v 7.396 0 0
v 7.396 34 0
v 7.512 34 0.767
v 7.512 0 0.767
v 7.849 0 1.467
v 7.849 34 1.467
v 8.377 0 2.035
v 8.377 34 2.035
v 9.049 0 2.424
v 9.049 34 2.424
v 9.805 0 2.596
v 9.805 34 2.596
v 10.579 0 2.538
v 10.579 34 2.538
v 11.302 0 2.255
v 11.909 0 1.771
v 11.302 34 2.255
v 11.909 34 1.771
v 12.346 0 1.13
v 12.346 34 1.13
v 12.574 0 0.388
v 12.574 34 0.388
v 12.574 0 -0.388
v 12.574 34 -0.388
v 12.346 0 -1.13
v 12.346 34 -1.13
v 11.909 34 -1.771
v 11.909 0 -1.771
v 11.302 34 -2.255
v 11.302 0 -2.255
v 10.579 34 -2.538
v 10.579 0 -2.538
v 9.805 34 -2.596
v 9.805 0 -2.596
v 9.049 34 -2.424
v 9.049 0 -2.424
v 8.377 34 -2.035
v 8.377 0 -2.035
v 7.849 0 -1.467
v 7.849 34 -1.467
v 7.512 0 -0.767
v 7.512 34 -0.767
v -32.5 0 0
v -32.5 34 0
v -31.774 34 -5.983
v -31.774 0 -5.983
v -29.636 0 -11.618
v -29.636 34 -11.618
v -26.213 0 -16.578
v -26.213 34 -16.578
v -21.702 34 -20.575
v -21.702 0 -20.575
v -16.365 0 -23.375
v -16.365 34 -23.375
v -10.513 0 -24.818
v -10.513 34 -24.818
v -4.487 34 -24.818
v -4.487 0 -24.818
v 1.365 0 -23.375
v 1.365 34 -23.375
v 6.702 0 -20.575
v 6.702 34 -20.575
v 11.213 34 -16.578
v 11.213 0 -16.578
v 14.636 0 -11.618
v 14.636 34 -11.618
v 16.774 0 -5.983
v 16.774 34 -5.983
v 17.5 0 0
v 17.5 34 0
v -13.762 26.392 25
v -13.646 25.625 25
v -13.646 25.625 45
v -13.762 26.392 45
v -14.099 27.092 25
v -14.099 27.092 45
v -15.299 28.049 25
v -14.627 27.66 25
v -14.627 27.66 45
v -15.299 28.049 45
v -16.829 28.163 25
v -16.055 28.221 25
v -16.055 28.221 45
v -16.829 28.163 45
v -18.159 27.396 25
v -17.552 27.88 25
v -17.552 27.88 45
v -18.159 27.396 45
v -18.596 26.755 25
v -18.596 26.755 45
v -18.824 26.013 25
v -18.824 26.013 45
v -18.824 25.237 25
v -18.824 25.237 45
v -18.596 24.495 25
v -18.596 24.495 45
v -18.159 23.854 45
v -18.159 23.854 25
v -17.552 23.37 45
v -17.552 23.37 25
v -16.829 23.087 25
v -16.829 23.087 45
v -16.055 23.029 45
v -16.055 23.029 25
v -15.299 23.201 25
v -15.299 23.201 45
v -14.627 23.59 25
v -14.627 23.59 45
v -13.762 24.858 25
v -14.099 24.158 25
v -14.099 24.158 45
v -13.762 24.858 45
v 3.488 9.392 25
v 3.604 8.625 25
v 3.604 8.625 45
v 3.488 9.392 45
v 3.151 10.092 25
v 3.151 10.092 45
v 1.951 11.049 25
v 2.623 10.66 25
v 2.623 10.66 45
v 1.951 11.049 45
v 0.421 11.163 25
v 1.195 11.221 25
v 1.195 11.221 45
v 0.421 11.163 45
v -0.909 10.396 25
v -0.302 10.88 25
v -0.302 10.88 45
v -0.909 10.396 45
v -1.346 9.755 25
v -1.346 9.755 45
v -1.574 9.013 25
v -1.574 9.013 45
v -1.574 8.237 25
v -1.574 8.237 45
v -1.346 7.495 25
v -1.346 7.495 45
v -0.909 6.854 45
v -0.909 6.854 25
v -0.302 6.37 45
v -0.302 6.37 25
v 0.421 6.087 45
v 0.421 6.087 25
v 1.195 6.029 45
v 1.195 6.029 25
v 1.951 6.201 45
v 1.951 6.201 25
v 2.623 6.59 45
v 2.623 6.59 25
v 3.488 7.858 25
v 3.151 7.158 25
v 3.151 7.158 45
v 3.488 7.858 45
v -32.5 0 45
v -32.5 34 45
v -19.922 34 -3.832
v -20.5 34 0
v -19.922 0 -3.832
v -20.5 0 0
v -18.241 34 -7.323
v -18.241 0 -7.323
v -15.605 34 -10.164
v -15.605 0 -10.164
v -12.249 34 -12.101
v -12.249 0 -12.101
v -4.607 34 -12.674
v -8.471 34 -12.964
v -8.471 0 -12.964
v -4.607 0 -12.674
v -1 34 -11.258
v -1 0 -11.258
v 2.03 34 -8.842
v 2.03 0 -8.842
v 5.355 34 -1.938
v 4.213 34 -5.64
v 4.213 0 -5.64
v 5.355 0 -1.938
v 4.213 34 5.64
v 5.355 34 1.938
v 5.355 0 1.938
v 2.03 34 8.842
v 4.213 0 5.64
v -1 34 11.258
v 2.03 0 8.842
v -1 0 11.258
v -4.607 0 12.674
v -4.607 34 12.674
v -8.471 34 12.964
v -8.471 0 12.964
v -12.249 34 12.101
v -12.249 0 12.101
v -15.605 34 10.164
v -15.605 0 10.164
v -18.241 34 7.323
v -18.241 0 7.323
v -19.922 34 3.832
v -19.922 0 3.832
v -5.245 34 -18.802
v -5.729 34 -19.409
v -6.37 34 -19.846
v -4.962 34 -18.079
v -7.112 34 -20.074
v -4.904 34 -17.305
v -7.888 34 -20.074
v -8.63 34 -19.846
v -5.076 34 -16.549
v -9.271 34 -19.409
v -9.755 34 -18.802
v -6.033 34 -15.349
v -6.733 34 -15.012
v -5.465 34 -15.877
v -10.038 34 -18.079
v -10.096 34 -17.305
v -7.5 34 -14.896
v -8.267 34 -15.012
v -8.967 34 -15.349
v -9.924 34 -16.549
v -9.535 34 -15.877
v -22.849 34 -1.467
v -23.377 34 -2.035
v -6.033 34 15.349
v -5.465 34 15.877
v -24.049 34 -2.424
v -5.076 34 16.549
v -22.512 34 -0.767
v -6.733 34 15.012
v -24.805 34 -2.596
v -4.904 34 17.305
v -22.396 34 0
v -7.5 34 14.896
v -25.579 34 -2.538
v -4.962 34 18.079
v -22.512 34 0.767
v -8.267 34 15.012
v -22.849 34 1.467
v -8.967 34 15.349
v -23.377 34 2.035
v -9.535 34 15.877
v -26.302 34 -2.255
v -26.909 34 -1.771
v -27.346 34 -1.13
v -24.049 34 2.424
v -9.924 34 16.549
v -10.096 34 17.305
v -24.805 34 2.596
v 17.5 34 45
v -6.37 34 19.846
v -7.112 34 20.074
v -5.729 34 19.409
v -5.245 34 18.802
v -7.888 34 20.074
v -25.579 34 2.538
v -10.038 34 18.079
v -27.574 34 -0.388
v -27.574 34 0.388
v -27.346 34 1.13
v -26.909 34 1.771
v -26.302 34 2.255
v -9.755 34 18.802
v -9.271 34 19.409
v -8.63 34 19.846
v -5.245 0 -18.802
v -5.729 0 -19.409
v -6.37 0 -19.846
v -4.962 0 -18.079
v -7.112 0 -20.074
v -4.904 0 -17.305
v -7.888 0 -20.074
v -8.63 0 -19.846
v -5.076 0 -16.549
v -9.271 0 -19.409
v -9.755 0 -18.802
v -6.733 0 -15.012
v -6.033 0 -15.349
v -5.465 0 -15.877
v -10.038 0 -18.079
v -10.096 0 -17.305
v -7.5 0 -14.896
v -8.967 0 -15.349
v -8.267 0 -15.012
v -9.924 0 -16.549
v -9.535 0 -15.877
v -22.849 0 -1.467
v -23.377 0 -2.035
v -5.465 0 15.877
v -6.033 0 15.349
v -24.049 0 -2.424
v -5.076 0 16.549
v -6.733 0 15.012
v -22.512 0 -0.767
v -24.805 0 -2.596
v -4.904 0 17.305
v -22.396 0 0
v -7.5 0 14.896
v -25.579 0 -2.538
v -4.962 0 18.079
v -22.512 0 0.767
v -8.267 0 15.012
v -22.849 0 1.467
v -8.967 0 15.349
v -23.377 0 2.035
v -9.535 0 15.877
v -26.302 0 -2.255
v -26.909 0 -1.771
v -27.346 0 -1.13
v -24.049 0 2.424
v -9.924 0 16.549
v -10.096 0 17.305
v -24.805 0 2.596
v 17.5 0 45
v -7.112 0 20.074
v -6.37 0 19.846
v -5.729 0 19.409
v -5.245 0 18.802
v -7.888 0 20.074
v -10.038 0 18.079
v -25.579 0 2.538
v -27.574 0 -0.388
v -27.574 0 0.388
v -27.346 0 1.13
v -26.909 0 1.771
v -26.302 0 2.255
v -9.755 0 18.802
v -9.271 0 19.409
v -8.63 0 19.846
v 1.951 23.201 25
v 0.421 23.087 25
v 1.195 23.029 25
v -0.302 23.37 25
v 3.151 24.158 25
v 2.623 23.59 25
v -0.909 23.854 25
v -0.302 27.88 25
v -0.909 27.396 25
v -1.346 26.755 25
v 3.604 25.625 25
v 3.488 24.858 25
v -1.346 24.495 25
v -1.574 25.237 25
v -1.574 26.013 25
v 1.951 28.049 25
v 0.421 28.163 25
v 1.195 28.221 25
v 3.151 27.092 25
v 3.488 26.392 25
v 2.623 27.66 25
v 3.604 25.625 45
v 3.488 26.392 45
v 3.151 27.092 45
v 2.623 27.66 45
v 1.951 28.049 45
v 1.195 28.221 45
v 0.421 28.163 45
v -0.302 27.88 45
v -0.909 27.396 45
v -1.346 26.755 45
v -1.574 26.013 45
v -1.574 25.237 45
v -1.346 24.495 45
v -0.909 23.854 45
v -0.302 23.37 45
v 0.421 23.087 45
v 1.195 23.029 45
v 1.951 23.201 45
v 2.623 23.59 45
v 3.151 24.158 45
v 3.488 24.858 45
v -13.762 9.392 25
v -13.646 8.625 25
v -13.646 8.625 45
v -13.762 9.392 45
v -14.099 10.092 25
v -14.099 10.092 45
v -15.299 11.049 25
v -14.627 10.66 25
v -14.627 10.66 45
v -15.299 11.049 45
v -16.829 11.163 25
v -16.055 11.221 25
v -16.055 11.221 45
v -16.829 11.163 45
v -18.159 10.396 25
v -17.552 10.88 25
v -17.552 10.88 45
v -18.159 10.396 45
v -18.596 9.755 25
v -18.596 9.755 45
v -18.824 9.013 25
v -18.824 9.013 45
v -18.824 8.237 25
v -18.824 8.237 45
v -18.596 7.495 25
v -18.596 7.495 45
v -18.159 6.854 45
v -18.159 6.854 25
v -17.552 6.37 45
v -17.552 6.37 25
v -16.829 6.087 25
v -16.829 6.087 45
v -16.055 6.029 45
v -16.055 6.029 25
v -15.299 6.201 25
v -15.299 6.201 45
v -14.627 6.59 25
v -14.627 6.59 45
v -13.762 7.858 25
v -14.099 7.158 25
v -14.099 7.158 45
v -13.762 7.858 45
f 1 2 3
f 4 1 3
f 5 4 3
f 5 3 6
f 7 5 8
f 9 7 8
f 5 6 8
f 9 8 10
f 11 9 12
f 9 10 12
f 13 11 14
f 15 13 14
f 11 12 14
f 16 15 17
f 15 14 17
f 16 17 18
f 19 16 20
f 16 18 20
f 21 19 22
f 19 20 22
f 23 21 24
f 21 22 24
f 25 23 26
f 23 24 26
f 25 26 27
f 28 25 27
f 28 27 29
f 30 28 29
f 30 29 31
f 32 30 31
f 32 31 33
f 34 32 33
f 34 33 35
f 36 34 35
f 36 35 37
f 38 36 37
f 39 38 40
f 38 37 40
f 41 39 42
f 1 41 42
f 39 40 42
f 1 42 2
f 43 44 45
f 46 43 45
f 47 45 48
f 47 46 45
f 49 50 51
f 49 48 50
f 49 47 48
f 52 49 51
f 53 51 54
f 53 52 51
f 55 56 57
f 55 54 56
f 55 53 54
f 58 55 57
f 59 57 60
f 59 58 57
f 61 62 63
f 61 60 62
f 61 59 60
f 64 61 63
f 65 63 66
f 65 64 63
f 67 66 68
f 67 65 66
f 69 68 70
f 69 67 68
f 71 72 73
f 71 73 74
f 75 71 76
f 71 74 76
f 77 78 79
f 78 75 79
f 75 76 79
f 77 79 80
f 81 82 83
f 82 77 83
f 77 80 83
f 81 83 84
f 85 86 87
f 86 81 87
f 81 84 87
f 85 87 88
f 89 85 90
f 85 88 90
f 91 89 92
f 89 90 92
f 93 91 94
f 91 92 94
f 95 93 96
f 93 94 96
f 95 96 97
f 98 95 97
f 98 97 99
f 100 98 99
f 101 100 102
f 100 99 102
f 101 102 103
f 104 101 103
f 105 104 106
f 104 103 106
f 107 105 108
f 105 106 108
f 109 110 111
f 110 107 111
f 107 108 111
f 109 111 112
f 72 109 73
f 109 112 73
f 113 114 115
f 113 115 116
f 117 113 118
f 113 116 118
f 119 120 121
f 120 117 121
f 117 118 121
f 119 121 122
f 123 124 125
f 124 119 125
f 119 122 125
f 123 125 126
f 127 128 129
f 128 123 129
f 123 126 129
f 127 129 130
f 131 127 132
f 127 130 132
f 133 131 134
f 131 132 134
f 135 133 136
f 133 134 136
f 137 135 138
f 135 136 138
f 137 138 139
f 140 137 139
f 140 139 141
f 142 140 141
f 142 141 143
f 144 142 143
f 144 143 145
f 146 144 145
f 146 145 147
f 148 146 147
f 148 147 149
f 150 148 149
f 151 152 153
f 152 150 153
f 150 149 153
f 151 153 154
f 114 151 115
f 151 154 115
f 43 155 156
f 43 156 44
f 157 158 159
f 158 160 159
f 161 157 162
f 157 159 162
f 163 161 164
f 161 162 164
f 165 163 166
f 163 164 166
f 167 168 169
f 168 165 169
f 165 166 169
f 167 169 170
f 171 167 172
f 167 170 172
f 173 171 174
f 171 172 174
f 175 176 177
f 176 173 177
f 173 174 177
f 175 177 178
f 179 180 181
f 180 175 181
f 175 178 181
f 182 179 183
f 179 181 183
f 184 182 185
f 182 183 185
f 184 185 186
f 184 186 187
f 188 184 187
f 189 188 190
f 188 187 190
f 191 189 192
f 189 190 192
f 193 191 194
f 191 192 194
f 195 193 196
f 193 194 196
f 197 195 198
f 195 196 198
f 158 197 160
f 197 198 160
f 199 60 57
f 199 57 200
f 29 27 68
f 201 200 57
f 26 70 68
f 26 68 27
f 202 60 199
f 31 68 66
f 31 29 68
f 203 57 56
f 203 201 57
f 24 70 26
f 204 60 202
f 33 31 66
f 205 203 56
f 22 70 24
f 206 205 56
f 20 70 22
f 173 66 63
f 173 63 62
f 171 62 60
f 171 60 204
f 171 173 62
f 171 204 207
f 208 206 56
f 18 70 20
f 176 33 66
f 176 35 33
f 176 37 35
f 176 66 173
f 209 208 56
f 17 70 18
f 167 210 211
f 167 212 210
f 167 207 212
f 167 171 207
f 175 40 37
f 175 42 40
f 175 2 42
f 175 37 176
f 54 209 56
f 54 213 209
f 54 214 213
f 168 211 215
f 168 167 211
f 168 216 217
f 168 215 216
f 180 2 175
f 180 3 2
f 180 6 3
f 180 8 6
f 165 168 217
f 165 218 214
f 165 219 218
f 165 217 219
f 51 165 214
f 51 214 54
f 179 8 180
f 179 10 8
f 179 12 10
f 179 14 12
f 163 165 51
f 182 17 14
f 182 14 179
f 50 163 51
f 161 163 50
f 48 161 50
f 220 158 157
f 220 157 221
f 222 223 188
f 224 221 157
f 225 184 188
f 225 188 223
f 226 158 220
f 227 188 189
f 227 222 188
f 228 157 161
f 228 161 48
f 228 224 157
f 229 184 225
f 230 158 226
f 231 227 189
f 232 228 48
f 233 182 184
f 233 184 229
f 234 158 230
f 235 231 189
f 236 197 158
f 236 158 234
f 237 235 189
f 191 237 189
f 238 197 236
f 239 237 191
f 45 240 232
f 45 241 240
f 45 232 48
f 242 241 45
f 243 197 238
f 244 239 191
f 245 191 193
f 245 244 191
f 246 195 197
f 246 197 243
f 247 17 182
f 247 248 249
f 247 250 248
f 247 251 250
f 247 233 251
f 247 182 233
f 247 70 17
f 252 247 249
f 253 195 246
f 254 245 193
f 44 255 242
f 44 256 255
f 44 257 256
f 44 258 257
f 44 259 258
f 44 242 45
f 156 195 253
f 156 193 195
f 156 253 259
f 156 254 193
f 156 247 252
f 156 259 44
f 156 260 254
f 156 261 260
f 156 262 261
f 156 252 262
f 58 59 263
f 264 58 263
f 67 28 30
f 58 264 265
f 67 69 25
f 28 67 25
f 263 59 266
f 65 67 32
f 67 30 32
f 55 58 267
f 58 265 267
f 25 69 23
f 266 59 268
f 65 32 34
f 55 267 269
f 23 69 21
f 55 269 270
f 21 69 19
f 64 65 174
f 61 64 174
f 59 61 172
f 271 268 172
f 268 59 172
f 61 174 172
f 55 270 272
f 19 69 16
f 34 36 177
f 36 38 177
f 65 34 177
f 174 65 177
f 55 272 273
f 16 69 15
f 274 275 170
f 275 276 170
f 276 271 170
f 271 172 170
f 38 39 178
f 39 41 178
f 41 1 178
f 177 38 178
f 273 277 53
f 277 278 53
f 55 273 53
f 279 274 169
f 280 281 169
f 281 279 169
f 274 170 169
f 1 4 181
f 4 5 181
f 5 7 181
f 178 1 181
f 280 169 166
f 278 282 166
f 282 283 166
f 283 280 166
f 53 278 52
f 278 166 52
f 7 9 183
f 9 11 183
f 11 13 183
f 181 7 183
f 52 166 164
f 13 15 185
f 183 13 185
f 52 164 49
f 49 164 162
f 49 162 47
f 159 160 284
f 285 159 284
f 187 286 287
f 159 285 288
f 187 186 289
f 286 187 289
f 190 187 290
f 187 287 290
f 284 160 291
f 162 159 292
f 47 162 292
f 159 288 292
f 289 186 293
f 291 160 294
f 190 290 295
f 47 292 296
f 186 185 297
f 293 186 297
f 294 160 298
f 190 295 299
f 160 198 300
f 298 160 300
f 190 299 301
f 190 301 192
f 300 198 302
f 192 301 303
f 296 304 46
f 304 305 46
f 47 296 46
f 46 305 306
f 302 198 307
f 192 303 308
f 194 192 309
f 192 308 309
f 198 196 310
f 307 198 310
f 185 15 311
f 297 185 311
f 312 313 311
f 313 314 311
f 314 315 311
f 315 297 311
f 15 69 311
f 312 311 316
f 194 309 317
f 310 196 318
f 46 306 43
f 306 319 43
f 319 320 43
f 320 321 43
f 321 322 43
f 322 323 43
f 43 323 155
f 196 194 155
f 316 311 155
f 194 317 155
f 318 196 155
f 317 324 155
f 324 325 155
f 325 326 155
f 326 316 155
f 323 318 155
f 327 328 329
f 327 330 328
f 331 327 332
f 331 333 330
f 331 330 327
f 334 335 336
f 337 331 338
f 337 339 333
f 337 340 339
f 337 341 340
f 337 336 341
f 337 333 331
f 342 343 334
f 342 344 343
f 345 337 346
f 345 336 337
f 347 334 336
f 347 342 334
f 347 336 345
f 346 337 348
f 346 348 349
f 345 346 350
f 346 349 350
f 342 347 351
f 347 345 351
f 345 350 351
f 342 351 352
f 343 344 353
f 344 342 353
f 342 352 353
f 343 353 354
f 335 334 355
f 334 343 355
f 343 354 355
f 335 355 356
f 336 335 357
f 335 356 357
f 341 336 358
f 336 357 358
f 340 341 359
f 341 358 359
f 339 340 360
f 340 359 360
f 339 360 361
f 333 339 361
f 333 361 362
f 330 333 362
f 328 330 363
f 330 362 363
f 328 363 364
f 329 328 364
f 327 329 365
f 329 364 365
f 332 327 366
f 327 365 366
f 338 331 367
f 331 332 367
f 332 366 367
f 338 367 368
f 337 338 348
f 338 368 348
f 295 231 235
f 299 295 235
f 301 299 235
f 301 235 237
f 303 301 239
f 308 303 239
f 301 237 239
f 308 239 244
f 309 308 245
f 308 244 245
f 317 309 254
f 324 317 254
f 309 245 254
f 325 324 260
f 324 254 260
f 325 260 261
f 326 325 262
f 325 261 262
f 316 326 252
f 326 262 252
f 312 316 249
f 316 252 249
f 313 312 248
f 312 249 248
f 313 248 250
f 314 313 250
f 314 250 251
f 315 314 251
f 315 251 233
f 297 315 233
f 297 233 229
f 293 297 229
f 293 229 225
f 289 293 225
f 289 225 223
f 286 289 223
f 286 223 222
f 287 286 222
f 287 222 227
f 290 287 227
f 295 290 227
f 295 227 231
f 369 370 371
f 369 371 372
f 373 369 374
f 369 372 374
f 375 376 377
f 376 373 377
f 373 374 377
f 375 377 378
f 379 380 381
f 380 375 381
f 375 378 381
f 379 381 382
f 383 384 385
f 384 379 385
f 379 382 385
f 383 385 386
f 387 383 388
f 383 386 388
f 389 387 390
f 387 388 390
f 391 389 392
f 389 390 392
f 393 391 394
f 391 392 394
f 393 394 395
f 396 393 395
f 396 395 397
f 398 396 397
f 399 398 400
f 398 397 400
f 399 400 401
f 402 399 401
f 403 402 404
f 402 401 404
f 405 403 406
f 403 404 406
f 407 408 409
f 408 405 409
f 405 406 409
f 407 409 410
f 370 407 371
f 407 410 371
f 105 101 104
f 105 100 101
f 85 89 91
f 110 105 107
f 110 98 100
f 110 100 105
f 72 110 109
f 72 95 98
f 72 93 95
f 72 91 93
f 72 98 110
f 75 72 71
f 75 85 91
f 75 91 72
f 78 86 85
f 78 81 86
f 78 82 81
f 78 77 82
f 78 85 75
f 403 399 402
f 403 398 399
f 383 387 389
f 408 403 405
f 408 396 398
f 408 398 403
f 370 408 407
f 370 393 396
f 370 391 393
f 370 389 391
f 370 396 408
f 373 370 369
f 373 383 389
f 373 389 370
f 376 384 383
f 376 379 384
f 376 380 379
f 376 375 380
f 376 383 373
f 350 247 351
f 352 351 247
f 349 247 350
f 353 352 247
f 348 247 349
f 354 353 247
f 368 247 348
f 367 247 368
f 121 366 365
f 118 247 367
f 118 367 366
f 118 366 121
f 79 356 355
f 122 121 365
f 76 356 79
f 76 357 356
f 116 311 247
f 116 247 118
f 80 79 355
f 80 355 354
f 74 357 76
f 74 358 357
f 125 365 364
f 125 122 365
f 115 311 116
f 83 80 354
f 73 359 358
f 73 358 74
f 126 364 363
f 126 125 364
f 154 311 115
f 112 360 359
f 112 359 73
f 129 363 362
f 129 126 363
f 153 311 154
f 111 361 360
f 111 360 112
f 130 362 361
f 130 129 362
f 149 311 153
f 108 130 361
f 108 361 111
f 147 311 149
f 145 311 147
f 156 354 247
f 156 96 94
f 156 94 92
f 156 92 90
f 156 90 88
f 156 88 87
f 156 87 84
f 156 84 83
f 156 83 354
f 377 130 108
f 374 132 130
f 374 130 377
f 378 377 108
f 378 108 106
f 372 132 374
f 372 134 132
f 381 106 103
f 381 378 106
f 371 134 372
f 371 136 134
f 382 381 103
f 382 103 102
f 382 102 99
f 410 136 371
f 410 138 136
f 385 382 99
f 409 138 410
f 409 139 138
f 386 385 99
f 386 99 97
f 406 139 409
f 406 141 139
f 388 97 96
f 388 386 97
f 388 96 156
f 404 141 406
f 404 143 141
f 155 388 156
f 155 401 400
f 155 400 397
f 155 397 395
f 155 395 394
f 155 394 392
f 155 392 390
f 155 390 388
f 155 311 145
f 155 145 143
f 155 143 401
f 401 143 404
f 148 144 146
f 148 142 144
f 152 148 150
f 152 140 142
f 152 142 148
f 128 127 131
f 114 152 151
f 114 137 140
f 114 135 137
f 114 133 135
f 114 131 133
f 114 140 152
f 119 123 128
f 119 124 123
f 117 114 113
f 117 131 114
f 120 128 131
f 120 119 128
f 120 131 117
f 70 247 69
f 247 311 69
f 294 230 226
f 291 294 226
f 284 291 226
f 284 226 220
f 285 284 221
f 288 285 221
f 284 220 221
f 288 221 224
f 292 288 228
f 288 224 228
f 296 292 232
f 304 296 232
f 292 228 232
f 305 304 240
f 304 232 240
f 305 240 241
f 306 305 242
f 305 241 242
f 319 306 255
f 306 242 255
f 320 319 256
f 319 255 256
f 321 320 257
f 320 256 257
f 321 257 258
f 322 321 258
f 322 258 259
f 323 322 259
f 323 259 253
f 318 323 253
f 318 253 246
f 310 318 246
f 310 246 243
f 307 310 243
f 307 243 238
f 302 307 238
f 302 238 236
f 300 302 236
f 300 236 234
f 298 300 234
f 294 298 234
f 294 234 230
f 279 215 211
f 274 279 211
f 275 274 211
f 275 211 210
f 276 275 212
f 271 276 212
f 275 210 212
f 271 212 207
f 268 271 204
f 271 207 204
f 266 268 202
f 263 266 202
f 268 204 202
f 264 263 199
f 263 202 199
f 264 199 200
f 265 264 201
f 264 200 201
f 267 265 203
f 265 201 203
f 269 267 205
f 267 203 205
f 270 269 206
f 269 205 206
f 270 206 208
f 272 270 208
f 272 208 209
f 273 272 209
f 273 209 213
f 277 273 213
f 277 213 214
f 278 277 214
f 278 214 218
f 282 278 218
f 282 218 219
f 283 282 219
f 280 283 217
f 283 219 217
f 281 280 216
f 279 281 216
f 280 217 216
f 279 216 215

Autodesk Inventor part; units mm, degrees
ref_plane "YZ Plane" through (0, 0, 0) normal (1, 0, 0) x (0, 1, 0)
ref_plane "XZ Plane" through (0, 0, 0) normal (0, 1, 0) x (-1, 0, 0)
ref_plane "XY Plane" through (0, 0, 0) normal (0, 0, 1) x (1, 0, 0)
sketch "Sketch1" plane through (0, 0, 0) normal (0, 1, 0) x (-1, 0, 0)
  circle A0 centre (7.5, 0) radius 13
  line L0 (-17.5, 45) -> (32.5, 45)
  line L1 (32.5, 45) -> (32.5, 0)
  line L2 (-17.5, 45) -> (-17.5, 0)
  arc A1 (-17.5, 0) -> (32.5, 0) centre (7.5, 0) ccw
  point P0 (0, 0)
  dimension "d1" = 26
  dimension "d6" = 50
  dimension "d29" = 45
extrude "Base" add sketch "Sketch1" along normal blind 34
sketch "Sketch3" plane through (0, 34, 0) normal (0, 1, 0) x (1, 0, 0)
  circle A0 centre (-7.5, 0) radius 13 projected
  line L0 (-7.5, 0) -> (-25, 0)
  line L1 (-25, 0) -> (10, 0)
  circle A1 centre (-25, 0) radius 2.6035
  point P0 (0, 0)
  dimension "d10" = 35
  dimension "d11" = 5.207
extrude "Screw Hole" cut sketch "Sketch3" against normal through all contours A1
pattern_circular "Circular Pattern1" count 4 over 360 about axis through (-7.5, 0, 0) along (0, 1, 0) of "Screw Hole"
sketch "Sketch4" plane through (-32.5, 0, 45) normal (0, 0, 1) x (1, 0, 0)
  line L0 (0, 0) -> (0, 34) projected
  line L1 (0, 17) -> (50, 17)
  line L2 (50, 0) -> (50, 34) projected
  line L3 (25, 17) -> (25, 25.625)
  line L4 (25, 25.625) -> (33.5, 25.625)
  circle A0 centre (33.5, 25.625) radius 2.6035
  point P0 (32.5, 0)
  dimension "d17" = 8.625
  dimension "d18" = 8.5
  dimension "d19" = 5.207
extrude "Mount Holes" cut sketch "Sketch4" against normal blind 20
pattern_linear "Rectangular Pattern1" count 2 spacing 17 along (0, -1, 0) count 2 spacing 17.25 along (-1, 0, 0) of "Mount Holes"
properties part number "LimbAttachment"
